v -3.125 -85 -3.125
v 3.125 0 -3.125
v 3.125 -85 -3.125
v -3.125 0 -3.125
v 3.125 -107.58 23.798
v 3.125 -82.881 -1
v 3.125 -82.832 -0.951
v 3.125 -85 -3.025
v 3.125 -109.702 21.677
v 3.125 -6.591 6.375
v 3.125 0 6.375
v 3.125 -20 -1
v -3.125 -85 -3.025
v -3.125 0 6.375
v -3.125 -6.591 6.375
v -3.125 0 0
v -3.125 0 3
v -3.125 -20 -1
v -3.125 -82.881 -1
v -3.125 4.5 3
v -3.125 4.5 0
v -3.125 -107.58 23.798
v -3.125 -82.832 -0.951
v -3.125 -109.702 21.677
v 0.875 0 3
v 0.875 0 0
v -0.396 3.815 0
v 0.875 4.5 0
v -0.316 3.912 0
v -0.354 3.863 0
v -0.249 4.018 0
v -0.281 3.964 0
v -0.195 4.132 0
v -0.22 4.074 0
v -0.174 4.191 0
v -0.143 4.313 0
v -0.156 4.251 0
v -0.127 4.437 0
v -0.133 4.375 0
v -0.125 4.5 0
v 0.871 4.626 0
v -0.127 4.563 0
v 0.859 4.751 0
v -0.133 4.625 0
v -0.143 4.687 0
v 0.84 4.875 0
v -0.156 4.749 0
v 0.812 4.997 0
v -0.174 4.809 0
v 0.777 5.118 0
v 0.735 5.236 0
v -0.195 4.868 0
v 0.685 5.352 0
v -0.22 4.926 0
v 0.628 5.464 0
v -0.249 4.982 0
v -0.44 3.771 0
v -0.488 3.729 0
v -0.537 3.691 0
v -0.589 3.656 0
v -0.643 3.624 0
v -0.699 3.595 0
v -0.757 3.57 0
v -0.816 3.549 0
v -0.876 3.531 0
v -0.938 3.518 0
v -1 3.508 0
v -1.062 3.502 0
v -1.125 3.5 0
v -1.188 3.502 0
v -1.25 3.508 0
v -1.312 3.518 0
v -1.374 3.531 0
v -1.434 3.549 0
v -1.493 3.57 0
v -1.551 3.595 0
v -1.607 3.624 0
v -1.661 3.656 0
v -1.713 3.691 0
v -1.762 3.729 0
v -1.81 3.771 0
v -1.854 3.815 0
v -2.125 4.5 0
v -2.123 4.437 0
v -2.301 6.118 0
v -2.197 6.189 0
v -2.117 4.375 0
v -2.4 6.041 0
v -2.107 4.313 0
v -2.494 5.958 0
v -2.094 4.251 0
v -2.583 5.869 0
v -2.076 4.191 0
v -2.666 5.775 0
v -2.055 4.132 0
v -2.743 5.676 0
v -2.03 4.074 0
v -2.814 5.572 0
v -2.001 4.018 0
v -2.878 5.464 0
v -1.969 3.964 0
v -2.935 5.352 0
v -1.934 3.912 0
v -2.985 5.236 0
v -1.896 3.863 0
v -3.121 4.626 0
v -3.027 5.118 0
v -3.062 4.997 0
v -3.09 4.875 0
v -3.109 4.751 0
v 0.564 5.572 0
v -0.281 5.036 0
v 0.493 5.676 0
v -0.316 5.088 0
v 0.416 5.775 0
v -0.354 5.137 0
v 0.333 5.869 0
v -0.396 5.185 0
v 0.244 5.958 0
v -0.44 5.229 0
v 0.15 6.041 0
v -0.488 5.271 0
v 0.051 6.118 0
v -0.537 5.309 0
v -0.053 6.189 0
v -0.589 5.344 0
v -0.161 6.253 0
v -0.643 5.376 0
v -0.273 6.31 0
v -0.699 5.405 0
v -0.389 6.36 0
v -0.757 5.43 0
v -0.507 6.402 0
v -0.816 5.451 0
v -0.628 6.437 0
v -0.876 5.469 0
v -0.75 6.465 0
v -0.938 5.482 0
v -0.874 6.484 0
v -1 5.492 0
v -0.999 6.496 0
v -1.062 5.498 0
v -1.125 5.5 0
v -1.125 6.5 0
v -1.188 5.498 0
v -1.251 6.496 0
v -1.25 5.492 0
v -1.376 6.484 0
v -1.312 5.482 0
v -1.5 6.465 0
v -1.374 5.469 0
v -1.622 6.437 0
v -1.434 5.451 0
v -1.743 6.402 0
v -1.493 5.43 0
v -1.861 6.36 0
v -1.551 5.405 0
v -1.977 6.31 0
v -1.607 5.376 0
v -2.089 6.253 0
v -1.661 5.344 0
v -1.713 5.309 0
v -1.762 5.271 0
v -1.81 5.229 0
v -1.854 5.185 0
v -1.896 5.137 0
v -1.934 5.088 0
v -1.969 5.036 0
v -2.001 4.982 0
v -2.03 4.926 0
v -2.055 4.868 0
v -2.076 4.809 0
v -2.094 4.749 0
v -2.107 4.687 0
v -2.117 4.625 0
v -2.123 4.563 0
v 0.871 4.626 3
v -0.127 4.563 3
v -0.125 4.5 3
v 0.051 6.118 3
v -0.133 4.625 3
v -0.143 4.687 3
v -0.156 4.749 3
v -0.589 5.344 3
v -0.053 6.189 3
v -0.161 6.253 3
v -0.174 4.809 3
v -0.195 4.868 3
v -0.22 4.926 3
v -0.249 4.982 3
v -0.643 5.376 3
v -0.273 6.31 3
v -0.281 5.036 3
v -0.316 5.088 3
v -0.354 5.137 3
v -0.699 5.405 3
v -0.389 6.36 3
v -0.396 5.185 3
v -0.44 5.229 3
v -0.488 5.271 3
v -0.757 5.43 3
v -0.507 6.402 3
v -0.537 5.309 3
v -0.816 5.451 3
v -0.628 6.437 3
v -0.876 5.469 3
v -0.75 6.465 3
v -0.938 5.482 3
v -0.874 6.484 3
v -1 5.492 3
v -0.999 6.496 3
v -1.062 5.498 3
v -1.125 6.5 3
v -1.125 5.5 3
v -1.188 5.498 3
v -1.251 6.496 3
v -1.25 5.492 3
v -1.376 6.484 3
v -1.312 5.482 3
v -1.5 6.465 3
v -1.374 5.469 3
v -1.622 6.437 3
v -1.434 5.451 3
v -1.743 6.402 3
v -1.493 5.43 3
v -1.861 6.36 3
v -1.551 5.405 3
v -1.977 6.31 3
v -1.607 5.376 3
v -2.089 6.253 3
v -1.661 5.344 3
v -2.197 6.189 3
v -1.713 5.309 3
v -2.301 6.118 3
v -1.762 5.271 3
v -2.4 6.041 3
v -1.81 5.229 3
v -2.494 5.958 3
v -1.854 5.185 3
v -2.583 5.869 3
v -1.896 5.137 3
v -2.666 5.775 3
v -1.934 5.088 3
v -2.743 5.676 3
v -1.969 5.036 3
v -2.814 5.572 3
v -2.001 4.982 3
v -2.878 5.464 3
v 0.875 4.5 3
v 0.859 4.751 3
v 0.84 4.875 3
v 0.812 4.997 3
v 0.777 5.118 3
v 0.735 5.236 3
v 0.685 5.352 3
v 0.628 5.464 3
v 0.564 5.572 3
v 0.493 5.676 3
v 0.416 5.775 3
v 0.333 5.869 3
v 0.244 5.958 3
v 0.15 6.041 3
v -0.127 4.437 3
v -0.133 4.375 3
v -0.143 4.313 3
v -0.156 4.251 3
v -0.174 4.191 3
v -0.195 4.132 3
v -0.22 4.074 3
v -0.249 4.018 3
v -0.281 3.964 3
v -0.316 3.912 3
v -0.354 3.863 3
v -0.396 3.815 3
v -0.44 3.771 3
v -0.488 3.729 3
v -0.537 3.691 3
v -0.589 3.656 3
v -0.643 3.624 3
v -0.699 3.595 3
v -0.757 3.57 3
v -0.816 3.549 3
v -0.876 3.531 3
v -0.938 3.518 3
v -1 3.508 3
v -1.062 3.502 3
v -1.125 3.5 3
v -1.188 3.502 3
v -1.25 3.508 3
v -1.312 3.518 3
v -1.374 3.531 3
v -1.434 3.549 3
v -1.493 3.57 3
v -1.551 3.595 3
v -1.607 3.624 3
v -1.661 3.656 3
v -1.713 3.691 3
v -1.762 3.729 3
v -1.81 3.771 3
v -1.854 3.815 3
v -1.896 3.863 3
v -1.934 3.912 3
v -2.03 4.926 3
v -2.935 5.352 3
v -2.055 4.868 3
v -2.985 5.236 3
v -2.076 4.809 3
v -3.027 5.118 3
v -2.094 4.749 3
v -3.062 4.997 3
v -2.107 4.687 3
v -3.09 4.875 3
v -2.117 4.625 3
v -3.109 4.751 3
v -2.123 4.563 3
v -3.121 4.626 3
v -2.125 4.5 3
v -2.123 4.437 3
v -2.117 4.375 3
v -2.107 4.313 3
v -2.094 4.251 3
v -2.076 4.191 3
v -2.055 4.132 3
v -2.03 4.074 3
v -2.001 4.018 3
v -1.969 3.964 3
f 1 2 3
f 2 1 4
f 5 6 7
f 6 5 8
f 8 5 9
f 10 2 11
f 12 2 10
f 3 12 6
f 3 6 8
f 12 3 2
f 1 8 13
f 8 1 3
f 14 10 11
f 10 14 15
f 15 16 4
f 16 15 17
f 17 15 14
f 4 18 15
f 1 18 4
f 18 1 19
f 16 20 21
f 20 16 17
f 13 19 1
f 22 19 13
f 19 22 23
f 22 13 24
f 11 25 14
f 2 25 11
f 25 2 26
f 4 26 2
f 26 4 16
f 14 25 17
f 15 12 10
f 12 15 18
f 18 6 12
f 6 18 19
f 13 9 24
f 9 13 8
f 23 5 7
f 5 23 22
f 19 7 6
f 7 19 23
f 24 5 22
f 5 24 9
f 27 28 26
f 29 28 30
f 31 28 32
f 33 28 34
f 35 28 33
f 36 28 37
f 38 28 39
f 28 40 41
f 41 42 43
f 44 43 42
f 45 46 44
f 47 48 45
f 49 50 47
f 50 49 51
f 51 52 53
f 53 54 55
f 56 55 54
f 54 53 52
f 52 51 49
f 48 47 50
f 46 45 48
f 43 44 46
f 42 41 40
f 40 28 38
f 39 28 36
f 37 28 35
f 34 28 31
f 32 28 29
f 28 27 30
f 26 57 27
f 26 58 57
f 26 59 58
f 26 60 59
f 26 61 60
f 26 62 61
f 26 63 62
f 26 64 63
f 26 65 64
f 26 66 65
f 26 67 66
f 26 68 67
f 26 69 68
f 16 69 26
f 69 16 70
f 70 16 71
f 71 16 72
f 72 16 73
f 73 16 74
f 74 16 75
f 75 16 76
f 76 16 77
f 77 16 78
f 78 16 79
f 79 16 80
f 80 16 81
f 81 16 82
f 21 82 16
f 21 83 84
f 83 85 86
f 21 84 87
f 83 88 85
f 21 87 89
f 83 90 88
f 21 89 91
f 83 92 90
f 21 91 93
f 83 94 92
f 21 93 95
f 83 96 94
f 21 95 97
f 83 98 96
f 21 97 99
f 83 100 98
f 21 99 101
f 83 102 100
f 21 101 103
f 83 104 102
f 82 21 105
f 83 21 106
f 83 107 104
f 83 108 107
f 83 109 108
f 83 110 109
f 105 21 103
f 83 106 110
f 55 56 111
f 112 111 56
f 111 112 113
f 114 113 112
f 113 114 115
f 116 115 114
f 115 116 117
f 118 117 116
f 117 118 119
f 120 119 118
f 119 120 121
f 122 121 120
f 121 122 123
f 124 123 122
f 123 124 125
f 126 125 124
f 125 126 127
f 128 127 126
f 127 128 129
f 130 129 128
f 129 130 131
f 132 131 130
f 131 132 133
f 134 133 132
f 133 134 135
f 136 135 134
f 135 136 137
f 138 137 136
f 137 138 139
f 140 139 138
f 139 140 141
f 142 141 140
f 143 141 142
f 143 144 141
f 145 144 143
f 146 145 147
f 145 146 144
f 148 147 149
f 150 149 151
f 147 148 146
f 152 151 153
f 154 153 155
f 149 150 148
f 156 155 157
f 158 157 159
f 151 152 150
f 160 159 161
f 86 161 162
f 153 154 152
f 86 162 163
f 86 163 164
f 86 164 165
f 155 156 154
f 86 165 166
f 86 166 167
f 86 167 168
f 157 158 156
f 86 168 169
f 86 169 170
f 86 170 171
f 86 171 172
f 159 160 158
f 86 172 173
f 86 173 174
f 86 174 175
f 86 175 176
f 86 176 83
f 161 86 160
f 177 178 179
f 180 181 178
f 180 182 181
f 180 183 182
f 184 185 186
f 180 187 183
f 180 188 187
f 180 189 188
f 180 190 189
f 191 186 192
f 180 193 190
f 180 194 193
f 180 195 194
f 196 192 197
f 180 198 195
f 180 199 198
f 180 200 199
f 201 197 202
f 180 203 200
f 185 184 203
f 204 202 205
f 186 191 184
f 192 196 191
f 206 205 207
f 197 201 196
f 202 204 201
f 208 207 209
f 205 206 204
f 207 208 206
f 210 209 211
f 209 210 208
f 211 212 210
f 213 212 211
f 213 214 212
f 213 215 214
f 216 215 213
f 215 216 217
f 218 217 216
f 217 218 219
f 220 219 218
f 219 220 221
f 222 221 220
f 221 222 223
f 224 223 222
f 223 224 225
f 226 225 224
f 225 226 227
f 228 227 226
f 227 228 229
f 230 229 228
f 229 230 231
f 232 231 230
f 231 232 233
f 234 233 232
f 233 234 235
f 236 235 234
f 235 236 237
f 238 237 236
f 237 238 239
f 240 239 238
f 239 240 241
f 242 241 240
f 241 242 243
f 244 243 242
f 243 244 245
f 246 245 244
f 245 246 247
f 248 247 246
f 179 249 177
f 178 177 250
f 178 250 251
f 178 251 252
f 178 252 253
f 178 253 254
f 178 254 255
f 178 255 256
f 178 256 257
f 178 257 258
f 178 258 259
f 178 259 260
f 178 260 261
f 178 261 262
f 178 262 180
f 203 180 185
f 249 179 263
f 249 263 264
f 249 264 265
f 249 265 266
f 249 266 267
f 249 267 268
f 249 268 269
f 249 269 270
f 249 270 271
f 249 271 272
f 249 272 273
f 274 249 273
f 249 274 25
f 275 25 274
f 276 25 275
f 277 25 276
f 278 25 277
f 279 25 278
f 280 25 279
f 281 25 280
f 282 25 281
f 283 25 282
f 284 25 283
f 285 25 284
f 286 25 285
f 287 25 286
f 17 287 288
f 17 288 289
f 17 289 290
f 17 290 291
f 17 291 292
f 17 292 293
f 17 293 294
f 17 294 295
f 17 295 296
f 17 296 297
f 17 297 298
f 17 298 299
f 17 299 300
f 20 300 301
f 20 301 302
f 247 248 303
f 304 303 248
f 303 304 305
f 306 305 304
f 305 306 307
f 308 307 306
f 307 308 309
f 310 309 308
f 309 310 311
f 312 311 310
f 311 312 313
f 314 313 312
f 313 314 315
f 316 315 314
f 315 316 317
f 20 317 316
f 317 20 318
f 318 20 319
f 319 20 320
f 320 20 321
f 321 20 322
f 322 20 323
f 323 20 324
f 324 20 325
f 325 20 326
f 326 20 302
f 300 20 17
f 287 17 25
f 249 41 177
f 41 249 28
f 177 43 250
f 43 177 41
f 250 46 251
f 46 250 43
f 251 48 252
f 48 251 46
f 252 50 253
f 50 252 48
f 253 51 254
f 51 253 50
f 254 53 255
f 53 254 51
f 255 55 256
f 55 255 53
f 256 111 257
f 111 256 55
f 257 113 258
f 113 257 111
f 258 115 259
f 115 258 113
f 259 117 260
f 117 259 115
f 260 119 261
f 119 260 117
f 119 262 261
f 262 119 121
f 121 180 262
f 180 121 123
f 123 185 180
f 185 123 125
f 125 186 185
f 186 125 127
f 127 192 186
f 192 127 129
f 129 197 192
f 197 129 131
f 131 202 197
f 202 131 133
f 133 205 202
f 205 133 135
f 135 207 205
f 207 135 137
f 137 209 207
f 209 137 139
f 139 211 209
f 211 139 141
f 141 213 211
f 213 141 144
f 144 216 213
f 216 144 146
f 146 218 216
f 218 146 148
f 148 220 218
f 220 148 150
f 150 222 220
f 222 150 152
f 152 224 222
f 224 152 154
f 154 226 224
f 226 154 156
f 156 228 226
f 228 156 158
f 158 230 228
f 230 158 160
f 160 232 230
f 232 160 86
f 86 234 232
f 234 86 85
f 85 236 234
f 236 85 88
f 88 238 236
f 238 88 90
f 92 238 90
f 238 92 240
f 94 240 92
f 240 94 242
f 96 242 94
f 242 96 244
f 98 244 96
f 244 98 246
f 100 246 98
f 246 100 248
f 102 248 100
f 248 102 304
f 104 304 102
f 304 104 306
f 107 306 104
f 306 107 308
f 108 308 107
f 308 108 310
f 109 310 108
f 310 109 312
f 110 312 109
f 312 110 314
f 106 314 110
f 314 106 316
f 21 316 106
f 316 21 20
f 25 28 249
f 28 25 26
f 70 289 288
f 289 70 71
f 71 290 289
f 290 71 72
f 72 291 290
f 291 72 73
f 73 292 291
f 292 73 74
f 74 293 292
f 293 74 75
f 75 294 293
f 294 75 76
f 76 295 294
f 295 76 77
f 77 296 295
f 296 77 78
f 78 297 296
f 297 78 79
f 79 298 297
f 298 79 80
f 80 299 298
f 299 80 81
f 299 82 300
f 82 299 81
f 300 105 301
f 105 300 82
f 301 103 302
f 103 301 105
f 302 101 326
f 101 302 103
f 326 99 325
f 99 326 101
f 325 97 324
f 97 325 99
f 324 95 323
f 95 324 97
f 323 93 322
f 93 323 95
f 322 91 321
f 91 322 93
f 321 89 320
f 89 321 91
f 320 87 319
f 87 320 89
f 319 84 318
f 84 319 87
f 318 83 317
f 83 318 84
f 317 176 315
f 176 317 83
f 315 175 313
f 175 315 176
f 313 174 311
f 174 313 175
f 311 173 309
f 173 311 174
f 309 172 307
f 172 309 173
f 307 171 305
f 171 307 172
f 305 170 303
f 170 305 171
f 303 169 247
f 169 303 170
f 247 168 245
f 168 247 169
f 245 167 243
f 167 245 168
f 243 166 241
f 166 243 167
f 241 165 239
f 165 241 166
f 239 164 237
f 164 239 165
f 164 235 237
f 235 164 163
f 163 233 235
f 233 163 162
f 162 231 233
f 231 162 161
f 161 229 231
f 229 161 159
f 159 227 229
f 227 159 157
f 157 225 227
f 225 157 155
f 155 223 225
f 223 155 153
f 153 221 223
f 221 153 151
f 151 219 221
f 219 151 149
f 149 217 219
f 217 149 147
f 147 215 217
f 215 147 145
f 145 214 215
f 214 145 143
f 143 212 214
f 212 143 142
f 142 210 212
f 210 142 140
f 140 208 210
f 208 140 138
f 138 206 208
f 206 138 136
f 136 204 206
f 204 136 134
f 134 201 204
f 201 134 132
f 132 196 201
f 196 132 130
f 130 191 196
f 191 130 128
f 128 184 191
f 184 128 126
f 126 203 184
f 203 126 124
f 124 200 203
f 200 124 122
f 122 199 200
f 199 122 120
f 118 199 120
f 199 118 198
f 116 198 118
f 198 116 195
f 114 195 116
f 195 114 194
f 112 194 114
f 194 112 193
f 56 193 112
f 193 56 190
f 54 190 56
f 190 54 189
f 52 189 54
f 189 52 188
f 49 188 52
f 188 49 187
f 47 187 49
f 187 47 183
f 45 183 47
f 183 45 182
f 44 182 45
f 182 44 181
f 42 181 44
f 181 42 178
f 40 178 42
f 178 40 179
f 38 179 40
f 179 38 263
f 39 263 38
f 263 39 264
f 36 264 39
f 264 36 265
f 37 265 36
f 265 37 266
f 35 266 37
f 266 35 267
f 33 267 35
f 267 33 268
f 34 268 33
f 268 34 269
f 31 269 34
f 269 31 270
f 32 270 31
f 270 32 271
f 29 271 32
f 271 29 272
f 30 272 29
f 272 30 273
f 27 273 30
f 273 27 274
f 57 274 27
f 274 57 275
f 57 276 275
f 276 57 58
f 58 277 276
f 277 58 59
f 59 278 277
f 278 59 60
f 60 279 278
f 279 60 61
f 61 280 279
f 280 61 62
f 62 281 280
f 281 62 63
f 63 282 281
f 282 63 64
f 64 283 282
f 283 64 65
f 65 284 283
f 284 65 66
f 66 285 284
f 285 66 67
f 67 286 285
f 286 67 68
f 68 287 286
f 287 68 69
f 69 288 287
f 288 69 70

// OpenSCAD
tol = 0;

hinge_w = 3.25;
base_x = 4;
base_y = 14;

spacing = 3 - tol;
bore = 2;

temple_length = 85;
temple_wall = hinge_w*2+spacing;
temple_width = 10;


drop_angle = 45;
drop_width = hinge_w+spacing;

// The fin that looks cool at the base
module fin() {
    polygon([
        [0,0],
        [temple_width/2, 0],
        [temple_wall/2, 10],
        [-temple_wall/2, 10],
        [-temple_width/2,0],
    ]);
}

module thinner() {
    x0 = hinge_w+spacing;
    l1 = 50;
    
    mirror([0, -1, 0])
    polygon([
        [-x0/2, 0],
        [x0/2, 0],
        [x0/2, l1],
        [x0/2, temple_length],
        [-x0/2,temple_length],
        [-x0/2,l1],
    ]);
 
}

module pin() {    
    translate([-hinge_w/2+.5, -7+4.5, 0])
    linear_extrude(spacing)
    difference() {
        union() {
            square([base_x, base_y], center=true);
            translate([0, base_y/2, 0])
            circle(d=base_x, $fn=100);
        }
        
        translate([0, base_y/2, 0])
        circle(d=bore + tol, $fn=100);
    }
}

pin();

difference() {
        
    translate([temple_width/2-temple_width/2, 0, -(hinge_w+spacing)/2])
    union() {
        
        difference() {
            
            union() {
                linear_extrude(temple_wall)
                thinner();

            }

            w = temple_length+base_y+10;
            h = 11;
            translate([-40, 0, (hinge_w+spacing)/2])
            rotate([0, 180-90, 0])
            translate([-10, -w, 0])
            linear_extrude(120)
            polygon([
                [0, 0],
                [h, 4],
                [h, w-20],
                [0, w-0],
                [0, 0],
            ]);            
        }
        
        drop_length = 35;
        translate([-drop_width/2, -temple_length+base_y-3.7, -10.2])
        rotate([-drop_angle, 0, 0])
        translate([0,-(base_y+temple_length)/2,0])
        linear_extrude(3)
        square([drop_width, drop_length]);
    }
}
